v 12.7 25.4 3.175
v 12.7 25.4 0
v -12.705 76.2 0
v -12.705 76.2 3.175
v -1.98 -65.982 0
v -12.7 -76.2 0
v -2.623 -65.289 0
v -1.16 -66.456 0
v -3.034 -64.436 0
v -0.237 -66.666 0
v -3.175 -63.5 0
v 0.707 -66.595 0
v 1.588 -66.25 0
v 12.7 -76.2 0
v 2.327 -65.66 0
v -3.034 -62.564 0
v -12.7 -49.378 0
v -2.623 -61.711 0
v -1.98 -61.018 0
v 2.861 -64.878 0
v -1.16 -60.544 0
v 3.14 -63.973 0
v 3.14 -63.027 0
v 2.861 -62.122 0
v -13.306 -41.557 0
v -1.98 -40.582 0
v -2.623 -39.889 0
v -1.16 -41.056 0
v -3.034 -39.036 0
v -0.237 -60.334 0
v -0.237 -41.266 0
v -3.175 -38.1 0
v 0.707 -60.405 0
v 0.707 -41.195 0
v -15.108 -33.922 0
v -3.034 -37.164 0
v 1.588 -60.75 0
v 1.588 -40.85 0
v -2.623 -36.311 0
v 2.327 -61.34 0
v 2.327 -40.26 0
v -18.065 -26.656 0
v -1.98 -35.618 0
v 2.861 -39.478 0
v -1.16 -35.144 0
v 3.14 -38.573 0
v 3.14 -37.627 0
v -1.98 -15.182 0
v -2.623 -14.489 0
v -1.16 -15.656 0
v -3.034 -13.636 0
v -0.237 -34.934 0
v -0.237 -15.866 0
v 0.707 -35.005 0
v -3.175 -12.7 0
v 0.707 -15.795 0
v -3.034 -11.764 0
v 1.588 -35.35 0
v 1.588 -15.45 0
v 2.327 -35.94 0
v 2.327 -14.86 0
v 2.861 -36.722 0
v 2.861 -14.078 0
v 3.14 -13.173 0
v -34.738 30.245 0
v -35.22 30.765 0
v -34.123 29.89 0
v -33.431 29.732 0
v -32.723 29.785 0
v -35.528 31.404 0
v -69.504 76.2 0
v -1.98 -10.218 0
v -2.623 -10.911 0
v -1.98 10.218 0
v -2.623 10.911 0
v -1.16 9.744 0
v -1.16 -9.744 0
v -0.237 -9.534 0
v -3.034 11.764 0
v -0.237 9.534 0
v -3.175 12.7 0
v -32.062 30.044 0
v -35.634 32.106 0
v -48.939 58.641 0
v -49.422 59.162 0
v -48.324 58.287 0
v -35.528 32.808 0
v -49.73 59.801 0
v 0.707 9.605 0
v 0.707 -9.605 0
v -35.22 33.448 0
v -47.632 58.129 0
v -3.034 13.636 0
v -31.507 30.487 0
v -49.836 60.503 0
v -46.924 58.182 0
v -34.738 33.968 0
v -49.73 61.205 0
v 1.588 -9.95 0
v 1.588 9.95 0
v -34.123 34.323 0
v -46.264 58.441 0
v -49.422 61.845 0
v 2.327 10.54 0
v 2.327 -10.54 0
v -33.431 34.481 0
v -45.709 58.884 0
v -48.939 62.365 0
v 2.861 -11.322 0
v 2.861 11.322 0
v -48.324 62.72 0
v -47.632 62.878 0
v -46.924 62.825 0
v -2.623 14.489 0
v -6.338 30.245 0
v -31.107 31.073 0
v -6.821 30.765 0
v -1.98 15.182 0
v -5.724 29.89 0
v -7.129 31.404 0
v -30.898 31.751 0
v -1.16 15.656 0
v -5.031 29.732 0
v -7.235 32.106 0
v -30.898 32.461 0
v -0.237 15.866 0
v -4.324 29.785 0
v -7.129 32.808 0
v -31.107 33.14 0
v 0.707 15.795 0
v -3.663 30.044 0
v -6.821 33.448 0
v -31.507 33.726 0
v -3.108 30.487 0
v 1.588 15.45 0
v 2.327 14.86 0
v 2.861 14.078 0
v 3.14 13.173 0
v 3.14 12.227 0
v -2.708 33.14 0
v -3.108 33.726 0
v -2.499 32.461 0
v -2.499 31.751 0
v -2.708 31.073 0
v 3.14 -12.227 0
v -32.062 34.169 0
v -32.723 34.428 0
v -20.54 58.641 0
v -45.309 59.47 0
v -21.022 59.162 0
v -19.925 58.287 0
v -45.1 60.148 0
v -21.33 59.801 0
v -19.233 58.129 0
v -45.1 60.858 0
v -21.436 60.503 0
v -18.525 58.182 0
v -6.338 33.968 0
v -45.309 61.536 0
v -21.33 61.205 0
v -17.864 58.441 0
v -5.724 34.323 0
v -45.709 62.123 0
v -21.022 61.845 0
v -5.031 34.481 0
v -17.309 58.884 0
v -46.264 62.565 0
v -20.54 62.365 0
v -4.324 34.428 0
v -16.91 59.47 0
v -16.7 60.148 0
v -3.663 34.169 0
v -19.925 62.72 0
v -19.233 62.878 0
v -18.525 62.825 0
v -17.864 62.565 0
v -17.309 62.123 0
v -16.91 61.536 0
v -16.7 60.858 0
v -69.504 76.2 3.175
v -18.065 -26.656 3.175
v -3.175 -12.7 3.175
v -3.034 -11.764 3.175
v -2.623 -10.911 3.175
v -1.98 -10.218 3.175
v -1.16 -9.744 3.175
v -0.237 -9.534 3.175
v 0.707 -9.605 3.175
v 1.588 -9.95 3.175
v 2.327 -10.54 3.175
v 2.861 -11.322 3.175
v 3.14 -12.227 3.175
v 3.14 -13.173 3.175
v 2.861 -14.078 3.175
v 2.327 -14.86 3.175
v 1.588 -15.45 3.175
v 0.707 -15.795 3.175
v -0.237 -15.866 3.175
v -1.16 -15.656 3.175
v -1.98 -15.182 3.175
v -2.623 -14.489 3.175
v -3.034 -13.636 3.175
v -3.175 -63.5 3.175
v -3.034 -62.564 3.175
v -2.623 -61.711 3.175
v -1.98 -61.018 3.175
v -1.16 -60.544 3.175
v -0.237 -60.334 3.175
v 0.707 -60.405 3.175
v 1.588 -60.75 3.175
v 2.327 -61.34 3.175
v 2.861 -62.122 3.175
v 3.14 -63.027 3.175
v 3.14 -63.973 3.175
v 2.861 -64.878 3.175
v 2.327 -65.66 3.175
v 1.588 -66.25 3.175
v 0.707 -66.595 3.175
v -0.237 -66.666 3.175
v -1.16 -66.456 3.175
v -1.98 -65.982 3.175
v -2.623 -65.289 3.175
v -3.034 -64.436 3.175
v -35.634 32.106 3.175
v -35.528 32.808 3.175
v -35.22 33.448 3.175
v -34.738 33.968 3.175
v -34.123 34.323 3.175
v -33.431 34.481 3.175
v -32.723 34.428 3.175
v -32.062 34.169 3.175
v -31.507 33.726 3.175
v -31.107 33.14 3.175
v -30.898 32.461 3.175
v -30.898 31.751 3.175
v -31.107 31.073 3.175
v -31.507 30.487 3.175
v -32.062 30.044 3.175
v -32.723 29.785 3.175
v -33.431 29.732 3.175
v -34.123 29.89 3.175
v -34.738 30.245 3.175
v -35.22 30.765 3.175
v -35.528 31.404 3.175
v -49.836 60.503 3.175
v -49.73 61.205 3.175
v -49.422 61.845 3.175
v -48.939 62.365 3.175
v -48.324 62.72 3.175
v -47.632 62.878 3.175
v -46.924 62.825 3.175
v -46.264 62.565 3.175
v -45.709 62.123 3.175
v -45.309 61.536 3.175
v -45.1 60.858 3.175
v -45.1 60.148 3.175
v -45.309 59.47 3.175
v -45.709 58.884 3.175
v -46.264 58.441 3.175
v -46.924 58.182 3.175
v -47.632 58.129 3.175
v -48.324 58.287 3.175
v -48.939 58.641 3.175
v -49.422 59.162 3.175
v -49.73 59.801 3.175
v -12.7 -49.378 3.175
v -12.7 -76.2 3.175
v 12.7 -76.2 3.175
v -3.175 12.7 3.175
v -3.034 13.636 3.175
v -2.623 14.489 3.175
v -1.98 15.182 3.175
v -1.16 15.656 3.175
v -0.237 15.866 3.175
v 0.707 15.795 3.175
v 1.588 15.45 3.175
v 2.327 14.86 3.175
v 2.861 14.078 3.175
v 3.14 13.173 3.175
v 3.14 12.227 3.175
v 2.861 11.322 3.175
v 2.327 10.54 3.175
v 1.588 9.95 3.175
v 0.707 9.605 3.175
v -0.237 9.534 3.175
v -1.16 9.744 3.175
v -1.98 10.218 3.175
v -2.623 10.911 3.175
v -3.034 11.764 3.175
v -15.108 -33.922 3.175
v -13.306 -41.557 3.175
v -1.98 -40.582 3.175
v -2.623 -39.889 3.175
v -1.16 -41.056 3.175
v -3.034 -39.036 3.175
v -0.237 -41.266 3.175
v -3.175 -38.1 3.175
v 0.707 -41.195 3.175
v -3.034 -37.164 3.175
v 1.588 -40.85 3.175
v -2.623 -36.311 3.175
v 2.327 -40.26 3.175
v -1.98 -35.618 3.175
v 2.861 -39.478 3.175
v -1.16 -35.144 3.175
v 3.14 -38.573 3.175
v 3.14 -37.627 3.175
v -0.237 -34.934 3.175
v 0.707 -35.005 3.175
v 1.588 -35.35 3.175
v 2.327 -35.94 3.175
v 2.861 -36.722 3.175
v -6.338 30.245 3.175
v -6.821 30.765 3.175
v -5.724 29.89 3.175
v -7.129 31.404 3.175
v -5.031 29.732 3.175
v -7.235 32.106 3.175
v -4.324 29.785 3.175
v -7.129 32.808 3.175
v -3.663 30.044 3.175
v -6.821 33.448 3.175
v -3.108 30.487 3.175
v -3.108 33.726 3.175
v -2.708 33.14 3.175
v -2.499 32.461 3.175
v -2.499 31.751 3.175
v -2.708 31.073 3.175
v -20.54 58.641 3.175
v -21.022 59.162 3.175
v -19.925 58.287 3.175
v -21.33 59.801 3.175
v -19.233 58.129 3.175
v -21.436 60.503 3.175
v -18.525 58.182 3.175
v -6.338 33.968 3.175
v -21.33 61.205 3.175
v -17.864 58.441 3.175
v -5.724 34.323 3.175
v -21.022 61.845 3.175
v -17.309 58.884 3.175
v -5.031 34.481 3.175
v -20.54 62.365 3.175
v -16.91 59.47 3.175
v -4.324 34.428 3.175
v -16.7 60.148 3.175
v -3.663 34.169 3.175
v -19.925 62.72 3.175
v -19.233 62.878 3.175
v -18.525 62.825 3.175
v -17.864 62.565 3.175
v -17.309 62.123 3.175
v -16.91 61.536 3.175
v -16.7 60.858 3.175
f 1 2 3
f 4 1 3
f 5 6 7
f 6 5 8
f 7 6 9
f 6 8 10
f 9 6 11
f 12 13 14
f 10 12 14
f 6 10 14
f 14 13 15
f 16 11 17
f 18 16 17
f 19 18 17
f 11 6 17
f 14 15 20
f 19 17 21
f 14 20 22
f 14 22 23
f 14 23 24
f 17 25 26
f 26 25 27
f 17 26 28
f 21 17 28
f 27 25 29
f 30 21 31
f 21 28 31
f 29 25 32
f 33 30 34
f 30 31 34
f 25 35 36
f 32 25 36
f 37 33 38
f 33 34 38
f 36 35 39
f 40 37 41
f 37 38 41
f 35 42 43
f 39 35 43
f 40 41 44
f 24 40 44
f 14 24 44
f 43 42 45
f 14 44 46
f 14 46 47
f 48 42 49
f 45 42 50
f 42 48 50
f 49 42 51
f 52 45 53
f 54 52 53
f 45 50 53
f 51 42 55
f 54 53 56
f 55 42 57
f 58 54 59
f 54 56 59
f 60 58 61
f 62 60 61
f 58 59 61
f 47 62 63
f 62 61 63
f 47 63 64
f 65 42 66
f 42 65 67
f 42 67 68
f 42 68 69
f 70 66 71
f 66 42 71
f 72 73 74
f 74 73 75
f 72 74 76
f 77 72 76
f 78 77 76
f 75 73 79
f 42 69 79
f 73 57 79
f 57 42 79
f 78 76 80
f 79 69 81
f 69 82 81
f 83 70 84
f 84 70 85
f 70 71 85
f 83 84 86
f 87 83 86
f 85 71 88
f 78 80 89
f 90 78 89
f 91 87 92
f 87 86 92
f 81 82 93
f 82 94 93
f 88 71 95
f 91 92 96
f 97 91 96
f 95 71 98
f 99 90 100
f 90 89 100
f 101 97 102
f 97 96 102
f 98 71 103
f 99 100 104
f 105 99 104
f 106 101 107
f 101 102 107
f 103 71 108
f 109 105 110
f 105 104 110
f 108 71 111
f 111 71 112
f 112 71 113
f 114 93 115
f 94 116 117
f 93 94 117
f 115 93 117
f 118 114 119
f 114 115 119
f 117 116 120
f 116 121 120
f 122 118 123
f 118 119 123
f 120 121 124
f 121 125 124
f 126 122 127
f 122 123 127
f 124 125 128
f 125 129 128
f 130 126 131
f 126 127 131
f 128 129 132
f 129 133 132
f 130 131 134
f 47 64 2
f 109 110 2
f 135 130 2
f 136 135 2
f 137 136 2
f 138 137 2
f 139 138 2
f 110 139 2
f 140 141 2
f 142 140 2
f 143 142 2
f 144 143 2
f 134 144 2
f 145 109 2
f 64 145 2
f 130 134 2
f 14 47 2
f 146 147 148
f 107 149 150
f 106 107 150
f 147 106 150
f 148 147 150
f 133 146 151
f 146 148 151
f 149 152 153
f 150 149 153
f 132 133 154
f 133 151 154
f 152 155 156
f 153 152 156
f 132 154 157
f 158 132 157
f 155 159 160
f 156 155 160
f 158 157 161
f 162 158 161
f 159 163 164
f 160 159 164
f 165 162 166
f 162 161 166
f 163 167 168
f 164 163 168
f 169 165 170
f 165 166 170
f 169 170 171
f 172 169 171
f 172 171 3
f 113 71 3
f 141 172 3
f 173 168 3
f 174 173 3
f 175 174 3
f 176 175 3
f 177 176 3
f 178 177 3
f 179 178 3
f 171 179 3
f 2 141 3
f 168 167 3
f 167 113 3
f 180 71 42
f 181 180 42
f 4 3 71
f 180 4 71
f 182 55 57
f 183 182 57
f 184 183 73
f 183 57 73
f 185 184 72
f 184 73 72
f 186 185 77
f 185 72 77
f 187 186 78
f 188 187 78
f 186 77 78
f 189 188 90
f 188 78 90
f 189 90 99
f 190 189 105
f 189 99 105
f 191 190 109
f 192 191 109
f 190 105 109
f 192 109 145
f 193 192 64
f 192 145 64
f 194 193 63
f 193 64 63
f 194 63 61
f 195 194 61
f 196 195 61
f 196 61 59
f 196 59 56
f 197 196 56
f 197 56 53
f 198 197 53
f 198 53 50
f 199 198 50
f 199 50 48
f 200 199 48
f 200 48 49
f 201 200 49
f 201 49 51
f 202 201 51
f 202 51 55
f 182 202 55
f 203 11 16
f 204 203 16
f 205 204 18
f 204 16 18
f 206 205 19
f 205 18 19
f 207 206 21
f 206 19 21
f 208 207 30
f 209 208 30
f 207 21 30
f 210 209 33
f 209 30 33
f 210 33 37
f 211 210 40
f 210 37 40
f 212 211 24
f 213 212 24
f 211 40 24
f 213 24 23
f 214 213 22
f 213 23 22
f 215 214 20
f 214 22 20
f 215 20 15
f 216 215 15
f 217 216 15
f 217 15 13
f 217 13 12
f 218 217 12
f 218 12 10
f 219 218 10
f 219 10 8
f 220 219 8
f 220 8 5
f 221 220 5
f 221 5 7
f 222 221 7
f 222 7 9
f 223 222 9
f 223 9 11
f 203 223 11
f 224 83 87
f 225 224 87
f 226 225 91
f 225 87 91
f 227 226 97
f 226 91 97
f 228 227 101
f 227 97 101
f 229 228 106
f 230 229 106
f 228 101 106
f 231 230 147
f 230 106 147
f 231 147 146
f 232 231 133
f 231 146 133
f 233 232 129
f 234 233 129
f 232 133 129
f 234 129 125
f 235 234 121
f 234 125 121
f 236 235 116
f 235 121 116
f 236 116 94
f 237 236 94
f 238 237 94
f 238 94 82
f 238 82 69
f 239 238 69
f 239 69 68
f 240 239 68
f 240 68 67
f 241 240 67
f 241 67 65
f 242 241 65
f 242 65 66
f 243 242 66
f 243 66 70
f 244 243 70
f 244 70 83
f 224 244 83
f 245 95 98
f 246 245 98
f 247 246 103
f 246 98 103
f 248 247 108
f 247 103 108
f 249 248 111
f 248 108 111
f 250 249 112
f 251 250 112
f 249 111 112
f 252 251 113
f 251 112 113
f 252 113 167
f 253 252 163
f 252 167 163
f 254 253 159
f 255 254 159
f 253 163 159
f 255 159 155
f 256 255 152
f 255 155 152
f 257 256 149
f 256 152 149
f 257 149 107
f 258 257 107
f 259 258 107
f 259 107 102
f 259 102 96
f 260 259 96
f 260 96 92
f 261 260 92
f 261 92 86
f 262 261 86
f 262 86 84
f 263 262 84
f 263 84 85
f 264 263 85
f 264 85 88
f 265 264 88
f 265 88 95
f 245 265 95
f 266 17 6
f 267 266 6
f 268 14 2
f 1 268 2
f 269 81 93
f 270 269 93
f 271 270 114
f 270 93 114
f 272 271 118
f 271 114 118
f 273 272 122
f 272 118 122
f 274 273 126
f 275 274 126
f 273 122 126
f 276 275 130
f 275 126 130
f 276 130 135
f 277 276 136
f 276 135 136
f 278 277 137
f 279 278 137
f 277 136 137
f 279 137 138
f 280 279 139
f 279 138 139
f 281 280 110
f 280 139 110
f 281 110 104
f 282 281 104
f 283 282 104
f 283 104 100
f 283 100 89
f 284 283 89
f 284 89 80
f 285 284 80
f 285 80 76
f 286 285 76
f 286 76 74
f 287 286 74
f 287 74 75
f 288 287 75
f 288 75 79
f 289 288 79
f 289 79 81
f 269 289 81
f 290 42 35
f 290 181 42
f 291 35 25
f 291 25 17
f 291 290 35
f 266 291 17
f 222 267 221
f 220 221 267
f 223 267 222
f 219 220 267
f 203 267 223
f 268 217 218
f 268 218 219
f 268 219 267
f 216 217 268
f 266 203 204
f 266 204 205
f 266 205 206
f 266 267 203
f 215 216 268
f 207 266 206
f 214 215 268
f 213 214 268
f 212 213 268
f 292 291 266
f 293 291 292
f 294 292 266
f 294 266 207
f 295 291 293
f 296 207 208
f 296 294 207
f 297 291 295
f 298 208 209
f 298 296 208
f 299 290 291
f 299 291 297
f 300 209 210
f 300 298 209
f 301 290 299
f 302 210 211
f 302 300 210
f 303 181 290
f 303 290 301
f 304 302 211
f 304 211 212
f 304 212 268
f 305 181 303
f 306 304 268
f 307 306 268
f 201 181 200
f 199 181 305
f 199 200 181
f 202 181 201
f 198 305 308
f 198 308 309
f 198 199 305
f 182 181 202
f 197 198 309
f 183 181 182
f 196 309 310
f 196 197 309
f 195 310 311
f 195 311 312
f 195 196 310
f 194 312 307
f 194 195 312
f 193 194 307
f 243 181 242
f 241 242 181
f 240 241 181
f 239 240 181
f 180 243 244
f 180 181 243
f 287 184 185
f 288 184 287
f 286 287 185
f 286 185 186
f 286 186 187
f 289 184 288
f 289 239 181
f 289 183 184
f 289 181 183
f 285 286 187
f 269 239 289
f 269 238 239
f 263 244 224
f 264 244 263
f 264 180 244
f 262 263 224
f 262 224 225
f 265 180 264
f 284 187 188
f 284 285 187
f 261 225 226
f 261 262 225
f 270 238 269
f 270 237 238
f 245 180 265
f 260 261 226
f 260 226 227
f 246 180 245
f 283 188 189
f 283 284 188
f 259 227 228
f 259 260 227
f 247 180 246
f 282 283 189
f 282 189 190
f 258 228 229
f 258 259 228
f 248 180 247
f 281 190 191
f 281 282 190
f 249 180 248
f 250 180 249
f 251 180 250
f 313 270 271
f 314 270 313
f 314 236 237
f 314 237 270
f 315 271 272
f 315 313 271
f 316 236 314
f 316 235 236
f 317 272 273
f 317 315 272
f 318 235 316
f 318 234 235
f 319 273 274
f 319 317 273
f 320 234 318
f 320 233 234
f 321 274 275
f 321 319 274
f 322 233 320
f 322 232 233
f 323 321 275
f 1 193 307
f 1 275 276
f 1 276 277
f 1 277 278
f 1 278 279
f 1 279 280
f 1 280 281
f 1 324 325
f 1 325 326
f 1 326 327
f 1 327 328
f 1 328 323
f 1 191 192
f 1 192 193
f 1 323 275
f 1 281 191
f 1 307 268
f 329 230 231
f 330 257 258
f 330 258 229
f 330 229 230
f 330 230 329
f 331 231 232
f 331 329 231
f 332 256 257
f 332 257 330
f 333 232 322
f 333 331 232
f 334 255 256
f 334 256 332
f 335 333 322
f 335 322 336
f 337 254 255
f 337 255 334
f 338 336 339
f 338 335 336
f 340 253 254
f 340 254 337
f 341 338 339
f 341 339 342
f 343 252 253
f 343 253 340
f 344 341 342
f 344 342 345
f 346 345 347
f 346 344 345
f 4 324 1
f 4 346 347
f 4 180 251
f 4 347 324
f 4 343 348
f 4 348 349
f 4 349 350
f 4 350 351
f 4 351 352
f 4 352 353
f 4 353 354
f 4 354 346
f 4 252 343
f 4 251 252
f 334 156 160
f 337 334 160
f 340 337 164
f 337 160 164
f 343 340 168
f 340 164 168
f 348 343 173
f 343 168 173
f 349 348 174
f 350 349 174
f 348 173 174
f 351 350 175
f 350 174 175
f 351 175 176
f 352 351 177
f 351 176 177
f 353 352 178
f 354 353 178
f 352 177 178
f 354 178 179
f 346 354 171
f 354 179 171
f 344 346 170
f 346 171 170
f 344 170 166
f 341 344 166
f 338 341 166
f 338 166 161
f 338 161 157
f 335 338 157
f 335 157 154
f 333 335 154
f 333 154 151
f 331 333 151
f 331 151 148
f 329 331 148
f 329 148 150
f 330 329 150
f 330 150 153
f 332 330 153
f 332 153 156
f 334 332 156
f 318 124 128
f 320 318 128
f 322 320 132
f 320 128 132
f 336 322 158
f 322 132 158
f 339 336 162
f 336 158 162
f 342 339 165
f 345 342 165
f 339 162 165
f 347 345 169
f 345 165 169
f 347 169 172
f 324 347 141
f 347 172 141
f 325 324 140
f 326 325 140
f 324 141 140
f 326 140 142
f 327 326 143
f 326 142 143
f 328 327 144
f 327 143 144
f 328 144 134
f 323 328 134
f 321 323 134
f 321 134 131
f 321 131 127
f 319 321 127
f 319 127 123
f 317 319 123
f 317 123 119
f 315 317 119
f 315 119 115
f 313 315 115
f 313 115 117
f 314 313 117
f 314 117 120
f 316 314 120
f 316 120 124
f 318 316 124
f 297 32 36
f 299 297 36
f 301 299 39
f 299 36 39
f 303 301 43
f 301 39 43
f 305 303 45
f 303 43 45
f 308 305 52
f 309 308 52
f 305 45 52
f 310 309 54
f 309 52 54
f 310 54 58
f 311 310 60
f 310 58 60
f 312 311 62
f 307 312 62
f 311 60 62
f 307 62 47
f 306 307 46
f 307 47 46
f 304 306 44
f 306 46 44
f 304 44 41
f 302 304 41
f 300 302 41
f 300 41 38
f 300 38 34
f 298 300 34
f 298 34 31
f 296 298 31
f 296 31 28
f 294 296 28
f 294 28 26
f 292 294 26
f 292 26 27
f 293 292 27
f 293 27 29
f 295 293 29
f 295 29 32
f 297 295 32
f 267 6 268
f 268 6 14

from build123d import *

# Parameters (mm, degrees)
BOSS_EXTRUDE1_DEPTH = 3.175
FILLET1_R           = 50.8
SKETCH2_R           = 3.175
CUT_EXTRUDE1_DEPTH  = 131.731020699
SKETCH3_R           = 2.38125
CUT_EXTRUDE2_DEPTH  = 131.731020699
SKETCH4_W           = 148.329762774
SKETCH4_H           = 42.508472293
CUT_EXTRUDE3_DEPTH  = 131.731020699


with BuildPart() as part:
    # Sketch1 → Boss-Extrude1 (new body)
    with BuildSketch(Plane.XY):
        Polygon((12.7, -76.2), (12.7, 25.4), (-25.408227408, 101.6), (-82.206807187, 101.6), (-12.7, -37.383601913), (-12.7, -76.2), align=None)
    extrude(amount=BOSS_EXTRUDE1_DEPTH)

    # Fillet1
    fillet1_edges = [part.edges().sort_by_distance(p)[0] for p in [
        (-12.7, -37.383601913, 1.5875),
    ]]
    fillet(fillet1_edges, radius=FILLET1_R)

    # Sketch2 → Cut-Extrude1 (cut, through all)
    with BuildSketch(Plane(origin=(0, 0, 0), x_dir=(-1, 0, 0), z_dir=(0, 0, -1))):
        with Locations((0, -63.5)):
            Circle(SKETCH2_R)
        with Locations((0, -38.1)):
            Circle(SKETCH2_R)
        with Locations((0, -12.7)):
            Circle(SKETCH2_R)
        with Locations((0, 12.7)):
            Circle(SKETCH2_R)
    extrude(amount=-CUT_EXTRUDE1_DEPTH, mode=Mode.SUBTRACT)

    # Sketch3 → Cut-Extrude2 (cut, through all)
    with BuildSketch(Plane(origin=(0, 0, 0), x_dir=(-1, 0, 0), z_dir=(0, 0, -1))):
        with Locations((33.256501118, 88.9)):
            Circle(SKETCH3_R)
        with Locations((61.655791008, 88.9)):
            Circle(SKETCH3_R)
        with Locations((19.055016681, 60.503163208)):
            Circle(SKETCH3_R)
        with Locations((47.45430657, 60.503163208)):
            Circle(SKETCH3_R)
        with Locations((4.853532243, 32.106326416)):
            Circle(SKETCH3_R)
        with Locations((33.252822133, 32.106326416)):
            Circle(SKETCH3_R)
    extrude(amount=-CUT_EXTRUDE2_DEPTH, mode=Mode.SUBTRACT)

    # Sketch4 → Cut-Extrude3 (cut, through all)
    with BuildSketch(Plane(origin=(0, 0, 0), x_dir=(-1, 0, 0), z_dir=(0, 0, -1))):
        with Locations((56.905806916, 97.454236147)):
            Rectangle(SKETCH4_W, SKETCH4_H)
    extrude(amount=-CUT_EXTRUDE3_DEPTH, mode=Mode.SUBTRACT)


solid = part.part
